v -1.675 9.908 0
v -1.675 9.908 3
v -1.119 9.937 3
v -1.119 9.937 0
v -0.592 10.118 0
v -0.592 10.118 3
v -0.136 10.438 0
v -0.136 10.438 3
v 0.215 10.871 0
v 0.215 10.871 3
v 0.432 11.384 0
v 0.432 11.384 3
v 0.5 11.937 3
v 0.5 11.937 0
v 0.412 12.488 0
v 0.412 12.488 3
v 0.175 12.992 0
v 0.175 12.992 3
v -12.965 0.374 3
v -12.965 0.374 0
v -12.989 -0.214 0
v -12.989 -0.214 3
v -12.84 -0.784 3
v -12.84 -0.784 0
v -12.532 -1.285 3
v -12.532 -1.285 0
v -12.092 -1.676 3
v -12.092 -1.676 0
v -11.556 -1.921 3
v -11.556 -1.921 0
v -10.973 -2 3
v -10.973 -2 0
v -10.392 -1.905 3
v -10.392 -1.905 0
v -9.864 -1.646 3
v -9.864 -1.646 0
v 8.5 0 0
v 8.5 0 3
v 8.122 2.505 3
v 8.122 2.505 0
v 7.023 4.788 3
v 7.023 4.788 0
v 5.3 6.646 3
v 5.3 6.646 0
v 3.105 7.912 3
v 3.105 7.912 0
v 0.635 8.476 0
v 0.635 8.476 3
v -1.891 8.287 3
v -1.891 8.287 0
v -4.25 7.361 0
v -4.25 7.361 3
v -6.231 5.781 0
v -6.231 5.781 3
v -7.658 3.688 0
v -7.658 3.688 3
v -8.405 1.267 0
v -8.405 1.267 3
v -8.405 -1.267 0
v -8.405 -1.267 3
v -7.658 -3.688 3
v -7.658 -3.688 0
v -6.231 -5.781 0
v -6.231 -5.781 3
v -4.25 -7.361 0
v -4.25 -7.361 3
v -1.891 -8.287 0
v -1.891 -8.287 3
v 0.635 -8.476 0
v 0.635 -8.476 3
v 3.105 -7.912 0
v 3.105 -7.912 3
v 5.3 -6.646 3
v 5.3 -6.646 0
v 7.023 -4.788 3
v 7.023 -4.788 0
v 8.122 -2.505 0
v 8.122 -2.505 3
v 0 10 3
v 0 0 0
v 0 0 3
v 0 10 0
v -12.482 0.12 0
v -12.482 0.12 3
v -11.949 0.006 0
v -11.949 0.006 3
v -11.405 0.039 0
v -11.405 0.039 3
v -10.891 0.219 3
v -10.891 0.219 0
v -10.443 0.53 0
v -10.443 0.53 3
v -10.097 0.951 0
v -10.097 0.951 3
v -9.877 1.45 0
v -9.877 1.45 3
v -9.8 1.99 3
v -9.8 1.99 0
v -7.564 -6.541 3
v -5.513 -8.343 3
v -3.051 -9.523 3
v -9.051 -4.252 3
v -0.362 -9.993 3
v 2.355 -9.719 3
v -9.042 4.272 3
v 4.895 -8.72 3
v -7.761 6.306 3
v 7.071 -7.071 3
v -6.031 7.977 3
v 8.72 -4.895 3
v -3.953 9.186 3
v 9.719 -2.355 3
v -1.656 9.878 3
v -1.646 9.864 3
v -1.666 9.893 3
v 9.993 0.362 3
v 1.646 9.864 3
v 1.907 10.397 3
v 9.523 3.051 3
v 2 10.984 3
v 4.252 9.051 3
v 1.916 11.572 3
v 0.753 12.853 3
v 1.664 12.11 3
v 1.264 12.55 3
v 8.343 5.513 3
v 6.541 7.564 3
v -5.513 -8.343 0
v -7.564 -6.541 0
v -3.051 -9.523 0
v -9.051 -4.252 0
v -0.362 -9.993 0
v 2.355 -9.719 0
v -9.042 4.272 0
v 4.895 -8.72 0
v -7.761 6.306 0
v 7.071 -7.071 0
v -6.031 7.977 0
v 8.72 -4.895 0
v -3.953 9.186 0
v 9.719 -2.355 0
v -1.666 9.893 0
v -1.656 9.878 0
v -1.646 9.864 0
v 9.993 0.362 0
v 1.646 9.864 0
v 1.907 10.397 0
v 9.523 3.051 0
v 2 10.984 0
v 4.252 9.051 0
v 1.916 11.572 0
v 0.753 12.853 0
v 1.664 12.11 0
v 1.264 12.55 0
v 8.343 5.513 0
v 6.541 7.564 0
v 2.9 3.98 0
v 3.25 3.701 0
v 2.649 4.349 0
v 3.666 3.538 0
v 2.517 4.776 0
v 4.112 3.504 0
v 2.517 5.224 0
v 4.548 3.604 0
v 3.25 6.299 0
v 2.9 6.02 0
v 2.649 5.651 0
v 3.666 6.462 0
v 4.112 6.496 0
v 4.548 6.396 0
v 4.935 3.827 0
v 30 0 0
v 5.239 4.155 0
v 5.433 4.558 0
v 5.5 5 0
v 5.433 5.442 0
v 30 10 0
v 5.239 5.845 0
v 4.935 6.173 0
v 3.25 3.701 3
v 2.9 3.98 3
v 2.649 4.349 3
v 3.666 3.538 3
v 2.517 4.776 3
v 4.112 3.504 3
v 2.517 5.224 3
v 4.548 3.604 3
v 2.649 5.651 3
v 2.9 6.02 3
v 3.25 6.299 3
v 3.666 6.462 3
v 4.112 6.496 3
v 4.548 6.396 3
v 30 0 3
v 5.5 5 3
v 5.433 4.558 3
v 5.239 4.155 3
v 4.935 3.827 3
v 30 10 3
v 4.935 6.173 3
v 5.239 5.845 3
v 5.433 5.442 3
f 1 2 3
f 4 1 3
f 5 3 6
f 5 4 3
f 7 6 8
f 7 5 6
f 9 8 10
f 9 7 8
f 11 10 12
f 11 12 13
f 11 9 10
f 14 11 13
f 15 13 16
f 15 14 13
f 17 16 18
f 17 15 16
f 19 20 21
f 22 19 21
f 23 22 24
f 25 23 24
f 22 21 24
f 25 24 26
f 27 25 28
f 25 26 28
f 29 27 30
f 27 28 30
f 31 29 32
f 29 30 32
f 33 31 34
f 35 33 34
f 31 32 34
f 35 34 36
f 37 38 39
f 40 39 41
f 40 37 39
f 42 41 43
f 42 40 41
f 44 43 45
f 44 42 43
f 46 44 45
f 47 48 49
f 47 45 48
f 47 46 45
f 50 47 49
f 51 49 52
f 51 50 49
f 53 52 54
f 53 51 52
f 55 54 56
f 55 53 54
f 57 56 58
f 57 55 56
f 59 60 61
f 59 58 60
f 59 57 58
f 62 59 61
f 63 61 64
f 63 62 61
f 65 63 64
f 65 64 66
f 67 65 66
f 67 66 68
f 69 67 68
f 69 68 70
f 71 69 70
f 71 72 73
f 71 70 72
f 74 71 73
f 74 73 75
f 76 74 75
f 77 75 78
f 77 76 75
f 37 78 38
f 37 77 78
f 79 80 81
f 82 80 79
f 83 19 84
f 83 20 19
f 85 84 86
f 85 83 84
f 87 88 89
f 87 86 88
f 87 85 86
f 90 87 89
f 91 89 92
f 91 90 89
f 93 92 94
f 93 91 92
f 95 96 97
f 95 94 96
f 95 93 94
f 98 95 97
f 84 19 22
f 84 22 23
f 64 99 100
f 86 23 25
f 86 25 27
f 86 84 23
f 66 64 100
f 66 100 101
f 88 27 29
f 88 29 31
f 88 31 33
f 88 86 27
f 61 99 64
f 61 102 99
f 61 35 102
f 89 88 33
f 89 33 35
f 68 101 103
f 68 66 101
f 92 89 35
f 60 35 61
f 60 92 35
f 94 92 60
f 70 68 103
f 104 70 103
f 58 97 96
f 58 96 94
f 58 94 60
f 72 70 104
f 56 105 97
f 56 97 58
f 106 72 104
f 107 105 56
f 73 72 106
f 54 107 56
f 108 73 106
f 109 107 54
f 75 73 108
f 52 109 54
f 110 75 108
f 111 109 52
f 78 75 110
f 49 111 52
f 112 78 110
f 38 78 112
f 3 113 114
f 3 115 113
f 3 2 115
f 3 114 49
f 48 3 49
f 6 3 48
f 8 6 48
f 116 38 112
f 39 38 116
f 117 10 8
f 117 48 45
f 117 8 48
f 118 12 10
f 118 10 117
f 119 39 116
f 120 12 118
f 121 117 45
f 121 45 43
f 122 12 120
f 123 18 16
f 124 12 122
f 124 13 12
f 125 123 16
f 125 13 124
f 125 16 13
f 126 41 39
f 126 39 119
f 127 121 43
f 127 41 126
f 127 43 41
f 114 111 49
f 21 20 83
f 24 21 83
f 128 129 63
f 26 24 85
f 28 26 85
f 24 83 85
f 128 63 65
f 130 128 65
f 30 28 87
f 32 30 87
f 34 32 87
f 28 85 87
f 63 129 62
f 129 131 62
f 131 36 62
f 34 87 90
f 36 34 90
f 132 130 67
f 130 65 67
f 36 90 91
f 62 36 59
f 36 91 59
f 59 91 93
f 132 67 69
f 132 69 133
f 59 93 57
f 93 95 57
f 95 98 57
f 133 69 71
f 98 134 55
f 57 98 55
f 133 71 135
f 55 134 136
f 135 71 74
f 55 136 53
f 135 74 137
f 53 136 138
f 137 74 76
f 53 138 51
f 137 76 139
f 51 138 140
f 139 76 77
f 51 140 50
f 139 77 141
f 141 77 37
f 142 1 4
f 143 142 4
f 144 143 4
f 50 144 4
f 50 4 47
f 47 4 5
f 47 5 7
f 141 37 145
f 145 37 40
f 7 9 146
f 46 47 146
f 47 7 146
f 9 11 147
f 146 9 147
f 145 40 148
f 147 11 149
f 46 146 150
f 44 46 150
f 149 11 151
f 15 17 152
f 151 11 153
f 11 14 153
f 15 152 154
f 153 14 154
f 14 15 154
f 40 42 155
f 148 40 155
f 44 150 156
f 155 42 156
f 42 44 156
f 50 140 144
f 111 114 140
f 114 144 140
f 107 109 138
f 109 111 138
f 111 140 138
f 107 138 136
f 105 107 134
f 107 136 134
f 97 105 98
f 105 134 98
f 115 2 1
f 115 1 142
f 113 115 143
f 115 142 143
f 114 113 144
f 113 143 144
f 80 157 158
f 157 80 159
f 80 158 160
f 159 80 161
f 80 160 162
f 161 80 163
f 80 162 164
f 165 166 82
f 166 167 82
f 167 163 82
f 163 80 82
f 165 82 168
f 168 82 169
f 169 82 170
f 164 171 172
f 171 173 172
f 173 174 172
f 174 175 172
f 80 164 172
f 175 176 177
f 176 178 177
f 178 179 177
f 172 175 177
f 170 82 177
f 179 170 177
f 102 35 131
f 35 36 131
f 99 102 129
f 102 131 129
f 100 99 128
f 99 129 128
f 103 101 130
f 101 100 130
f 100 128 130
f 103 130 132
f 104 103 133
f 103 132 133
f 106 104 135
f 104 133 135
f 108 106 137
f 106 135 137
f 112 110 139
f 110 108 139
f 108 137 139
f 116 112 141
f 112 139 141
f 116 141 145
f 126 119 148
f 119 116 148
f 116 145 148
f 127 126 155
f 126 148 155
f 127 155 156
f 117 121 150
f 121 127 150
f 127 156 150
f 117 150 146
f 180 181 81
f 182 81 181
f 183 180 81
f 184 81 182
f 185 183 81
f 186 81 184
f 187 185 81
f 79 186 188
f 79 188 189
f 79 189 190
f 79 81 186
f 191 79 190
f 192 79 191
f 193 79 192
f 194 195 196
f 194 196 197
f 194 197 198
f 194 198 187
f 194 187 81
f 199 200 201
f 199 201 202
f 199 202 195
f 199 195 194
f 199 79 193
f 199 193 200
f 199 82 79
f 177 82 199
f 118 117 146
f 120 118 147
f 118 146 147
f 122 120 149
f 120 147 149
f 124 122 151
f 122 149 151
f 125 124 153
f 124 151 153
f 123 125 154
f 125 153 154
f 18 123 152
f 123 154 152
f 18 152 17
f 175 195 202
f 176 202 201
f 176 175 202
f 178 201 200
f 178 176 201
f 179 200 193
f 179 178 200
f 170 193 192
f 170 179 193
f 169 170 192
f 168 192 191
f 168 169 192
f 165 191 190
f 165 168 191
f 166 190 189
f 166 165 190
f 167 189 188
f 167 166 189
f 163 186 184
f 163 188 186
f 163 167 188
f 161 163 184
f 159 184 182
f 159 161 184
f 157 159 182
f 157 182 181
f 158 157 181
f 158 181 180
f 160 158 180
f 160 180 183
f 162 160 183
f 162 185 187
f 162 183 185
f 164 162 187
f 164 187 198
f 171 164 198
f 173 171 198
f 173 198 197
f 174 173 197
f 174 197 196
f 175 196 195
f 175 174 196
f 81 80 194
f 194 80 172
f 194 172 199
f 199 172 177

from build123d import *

# Parameters (mm, degrees)
CYLINDER_R                  = 1.5
CYLINDER_DEPTH              = 10
BOX_W                       = 30
BOX_H                       = 10
BOX_DEPTH                   = 3
CYLINDER006_R               = 2
CYLINDER006_DEPTH           = 3
CYLINDER006_PLACEMENT_ANGLE = 105
CYLINDER005_R               = 2
CYLINDER005_DEPTH           = 3
CYLINDER005_PLACEMENT_ANGLE = 105
CYLINDER004_R               = 2
CYLINDER004_DEPTH           = 3
CYLINDER003_R               = 2
CYLINDER003_DEPTH           = 3
CYLINDER002_R               = 8.5
CYLINDER002_DEPTH           = 10
CYLINDER001_R               = 10
CYLINDER001_DEPTH           = 3


with BuildPart() as cylinder:
    # Cylinder → Cylinder (new body)
    with BuildSketch(Plane(origin=(4, 5, 0), x_dir=(1, 0, 0), z_dir=(0, 0, 1))):
        Circle(CYLINDER_R)
    extrude(amount=CYLINDER_DEPTH)


with BuildPart() as cut:
    # Box → Box (new body)
    with BuildSketch(Plane.XY):
        with Locations((15, 5)):
            Rectangle(BOX_W, BOX_H)
    extrude(amount=BOX_DEPTH)

    # Cut: cut Cylinder
    add(cylinder.part, mode=Mode.SUBTRACT)


with BuildPart() as cylinder006:
    # Cylinder006 → Cylinder006 (new body)
    with BuildSketch(Plane.XY):
        Circle(CYLINDER006_R)
    extrude(amount=CYLINDER006_DEPTH)


with BuildPart() as cylinder006_1:
    # Cylinder006 placement: moved
    add(cylinder006.part.moved(Location((-11.8, 2, 0))).rotate(Axis((-11.8, 2, 0), (0, 0, -1)), CYLINDER006_PLACEMENT_ANGLE))


with BuildPart() as cylinder005:
    # Cylinder005 → Cylinder005 (new body)
    with BuildSketch(Plane.XY):
        Circle(CYLINDER005_R)
    extrude(amount=CYLINDER005_DEPTH)


with BuildPart() as cylinder005_1:
    # Cylinder005 placement: moved
    add(cylinder005.part.moved(Location((-1.5, 11.9, 0))).rotate(Axis((-1.5, 11.9, 0), (0, 0, -1)), CYLINDER005_PLACEMENT_ANGLE))


with BuildPart() as cylinder004:
    # Cylinder004 → Cylinder004 (new body)
    with BuildSketch(Plane(origin=(-11, 0, 0), x_dir=(1, 0, 0), z_dir=(0, 0, 1))):
        Circle(CYLINDER004_R)
    extrude(amount=CYLINDER004_DEPTH)


with BuildPart() as cylinder003:
    # Cylinder003 → Cylinder003 (new body)
    with BuildSketch(Plane(origin=(0, 11, 0), x_dir=(1, 0, 0), z_dir=(0, 0, 1))):
        Circle(CYLINDER003_R)
    extrude(amount=CYLINDER003_DEPTH)


with BuildPart() as cylinder002:
    # Cylinder002 → Cylinder002 (new body)
    with BuildSketch(Plane.XY):
        Circle(CYLINDER002_R)
    extrude(amount=CYLINDER002_DEPTH)


with BuildPart() as cut003:
    # Cylinder001 → Cylinder001 (new body)
    with BuildSketch(Plane.XY):
        Circle(CYLINDER001_R)
    extrude(amount=CYLINDER001_DEPTH)

    # Cut001: cut Cylinder002
    add(cylinder002.part, mode=Mode.SUBTRACT)

    # Fusion: union Cylinder004, Cylinder003
    add(cylinder004.part)
    add(cylinder003.part)

    # Cut002: cut Cylinder005
    add(cylinder005_1.part, mode=Mode.SUBTRACT)

    # Cut003: cut Cylinder006
    add(cylinder006_1.part, mode=Mode.SUBTRACT)


solid = Compound([cut.part, cut003.part])
